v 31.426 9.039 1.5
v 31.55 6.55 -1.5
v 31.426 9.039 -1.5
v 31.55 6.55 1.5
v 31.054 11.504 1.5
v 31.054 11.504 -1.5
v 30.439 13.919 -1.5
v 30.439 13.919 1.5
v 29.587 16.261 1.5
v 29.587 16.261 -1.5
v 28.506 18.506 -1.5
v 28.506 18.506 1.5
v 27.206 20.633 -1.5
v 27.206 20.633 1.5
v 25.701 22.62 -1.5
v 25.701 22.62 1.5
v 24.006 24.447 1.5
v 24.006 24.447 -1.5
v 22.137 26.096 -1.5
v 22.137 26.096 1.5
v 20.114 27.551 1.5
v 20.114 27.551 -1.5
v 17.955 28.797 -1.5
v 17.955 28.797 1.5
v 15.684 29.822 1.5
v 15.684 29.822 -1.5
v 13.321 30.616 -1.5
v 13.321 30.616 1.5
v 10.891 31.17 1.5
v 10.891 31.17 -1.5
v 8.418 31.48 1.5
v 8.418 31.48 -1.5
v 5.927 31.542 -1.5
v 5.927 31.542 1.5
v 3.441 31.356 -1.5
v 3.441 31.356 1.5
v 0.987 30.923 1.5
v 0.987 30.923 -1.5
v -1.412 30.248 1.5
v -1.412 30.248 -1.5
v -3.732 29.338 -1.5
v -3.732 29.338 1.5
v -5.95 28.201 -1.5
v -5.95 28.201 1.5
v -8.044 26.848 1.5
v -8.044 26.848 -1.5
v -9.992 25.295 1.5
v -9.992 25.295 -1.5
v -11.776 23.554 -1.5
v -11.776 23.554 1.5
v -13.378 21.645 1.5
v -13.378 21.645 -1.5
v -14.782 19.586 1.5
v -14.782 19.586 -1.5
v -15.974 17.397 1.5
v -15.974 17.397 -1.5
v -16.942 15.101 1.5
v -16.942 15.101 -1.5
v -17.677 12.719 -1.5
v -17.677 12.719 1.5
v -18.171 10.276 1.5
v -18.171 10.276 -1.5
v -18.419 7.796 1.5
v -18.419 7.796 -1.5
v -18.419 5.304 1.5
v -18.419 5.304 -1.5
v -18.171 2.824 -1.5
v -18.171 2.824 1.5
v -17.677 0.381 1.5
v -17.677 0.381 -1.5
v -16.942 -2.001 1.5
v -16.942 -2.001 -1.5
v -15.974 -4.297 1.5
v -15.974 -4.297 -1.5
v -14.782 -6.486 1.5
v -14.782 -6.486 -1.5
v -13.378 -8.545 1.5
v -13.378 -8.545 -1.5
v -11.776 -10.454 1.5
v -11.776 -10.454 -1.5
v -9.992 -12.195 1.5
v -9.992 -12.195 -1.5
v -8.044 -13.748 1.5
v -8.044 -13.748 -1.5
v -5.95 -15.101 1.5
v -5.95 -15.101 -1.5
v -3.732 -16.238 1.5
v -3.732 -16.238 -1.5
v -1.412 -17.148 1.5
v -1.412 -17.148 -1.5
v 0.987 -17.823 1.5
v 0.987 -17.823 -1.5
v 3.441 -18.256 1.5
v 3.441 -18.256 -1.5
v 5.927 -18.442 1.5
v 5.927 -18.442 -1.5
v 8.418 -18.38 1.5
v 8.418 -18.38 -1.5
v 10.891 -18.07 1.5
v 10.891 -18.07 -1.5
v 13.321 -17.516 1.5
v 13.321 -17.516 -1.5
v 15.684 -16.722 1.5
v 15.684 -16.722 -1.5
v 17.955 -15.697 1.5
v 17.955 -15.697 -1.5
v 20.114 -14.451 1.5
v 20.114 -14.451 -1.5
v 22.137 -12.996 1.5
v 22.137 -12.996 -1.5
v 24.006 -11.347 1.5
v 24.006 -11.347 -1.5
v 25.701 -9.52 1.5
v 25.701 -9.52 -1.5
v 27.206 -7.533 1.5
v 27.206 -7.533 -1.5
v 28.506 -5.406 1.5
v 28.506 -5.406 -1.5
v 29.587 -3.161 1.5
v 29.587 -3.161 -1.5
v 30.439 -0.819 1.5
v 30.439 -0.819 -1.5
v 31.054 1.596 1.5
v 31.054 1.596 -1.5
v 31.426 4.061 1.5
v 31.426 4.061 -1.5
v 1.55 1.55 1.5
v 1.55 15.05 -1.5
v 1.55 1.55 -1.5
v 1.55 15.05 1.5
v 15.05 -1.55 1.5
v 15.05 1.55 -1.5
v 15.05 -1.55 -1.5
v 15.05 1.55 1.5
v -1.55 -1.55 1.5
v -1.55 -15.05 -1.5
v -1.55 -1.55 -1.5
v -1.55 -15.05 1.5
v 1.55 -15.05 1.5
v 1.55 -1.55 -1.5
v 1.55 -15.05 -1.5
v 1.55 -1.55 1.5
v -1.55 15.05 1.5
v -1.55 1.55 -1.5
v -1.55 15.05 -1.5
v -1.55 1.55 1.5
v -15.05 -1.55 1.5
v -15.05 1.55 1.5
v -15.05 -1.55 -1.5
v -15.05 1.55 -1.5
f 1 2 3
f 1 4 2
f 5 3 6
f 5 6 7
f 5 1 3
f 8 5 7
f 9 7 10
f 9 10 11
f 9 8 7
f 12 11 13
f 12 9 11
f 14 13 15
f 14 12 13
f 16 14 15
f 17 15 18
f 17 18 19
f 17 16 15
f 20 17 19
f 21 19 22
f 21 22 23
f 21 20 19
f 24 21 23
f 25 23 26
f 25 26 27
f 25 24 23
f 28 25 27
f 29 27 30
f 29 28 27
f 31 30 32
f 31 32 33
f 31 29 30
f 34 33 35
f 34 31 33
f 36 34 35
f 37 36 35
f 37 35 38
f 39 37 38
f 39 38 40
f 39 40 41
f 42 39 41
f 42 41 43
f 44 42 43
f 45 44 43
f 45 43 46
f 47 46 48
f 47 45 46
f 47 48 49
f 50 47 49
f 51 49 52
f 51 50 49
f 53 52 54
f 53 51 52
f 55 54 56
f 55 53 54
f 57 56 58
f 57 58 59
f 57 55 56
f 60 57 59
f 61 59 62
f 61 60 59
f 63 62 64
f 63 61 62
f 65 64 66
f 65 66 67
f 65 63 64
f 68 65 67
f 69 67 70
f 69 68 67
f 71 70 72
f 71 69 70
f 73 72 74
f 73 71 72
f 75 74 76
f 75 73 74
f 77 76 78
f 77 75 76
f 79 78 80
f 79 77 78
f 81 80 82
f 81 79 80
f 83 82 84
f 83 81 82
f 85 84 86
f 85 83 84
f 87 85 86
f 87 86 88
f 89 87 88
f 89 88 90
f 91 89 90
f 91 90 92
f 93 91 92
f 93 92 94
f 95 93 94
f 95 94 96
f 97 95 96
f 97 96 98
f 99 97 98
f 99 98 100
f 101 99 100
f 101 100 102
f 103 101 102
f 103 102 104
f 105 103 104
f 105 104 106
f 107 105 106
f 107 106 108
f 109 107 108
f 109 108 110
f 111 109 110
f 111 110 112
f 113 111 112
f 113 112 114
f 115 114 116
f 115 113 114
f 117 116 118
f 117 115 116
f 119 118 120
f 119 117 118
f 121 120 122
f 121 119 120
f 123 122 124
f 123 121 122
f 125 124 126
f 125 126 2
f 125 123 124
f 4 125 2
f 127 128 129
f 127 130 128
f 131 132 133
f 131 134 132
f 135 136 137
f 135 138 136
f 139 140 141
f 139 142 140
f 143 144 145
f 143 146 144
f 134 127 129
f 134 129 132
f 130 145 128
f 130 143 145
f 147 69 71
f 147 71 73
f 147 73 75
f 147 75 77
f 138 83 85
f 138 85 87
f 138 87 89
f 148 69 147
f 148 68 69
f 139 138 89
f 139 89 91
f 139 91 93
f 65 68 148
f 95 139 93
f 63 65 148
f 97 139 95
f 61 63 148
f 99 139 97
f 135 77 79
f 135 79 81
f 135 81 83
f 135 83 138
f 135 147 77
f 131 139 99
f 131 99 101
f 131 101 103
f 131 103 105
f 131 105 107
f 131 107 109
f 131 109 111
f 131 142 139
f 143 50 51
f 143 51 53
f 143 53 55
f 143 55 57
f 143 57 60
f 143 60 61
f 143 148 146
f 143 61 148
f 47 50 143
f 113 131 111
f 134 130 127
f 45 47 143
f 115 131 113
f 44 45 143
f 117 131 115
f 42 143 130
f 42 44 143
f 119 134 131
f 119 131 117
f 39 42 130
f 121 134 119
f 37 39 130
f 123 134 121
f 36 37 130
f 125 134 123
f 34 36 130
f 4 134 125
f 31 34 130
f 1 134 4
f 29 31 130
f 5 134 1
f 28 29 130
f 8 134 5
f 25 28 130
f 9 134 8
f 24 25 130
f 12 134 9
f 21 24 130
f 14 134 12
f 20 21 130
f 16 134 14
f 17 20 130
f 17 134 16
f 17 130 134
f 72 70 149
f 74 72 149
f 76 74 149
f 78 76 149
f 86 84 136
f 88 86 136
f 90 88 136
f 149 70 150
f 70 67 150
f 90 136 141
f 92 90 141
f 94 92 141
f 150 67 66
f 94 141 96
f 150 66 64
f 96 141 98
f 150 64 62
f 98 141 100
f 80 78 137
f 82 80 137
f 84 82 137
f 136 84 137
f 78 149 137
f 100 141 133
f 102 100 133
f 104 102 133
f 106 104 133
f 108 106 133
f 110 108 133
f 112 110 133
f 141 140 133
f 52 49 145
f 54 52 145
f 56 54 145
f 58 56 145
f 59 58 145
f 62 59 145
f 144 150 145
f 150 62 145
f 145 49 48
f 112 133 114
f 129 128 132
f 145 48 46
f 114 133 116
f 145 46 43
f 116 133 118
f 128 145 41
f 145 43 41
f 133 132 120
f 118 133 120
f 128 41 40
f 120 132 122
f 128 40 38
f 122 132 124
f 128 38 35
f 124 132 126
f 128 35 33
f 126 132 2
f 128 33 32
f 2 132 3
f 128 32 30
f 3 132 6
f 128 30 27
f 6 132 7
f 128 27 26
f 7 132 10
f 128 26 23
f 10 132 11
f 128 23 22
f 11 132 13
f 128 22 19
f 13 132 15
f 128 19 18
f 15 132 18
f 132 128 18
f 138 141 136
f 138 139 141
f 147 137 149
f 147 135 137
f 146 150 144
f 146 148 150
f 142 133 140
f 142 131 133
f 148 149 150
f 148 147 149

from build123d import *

# Parameters (mm, degrees)
SKETCH1_R           = 25
BOSS_EXTRUDE1_DEPTH = 1.5


with BuildPart() as part:
    # Sketch1 → Boss-Extrude1 (new body, symmetric)
    with BuildSketch(Plane.XY):
        with Locations((6.55, 6.55)):
            Circle(SKETCH1_R)
        Polygon((1.55, 1.55), (15.05, 1.55), (15.05, -1.55), (1.55, -1.55), (1.55, -15.05), (-1.55, -15.05), (-1.55, -1.55), (-15.05, -1.55), (-15.05, 1.55), (-1.55, 1.55), (-1.55, 15.05), (1.55, 15.05), align=None, mode=Mode.SUBTRACT)
    extrude(amount=BOSS_EXTRUDE1_DEPTH, both=True)


solid = part.part
